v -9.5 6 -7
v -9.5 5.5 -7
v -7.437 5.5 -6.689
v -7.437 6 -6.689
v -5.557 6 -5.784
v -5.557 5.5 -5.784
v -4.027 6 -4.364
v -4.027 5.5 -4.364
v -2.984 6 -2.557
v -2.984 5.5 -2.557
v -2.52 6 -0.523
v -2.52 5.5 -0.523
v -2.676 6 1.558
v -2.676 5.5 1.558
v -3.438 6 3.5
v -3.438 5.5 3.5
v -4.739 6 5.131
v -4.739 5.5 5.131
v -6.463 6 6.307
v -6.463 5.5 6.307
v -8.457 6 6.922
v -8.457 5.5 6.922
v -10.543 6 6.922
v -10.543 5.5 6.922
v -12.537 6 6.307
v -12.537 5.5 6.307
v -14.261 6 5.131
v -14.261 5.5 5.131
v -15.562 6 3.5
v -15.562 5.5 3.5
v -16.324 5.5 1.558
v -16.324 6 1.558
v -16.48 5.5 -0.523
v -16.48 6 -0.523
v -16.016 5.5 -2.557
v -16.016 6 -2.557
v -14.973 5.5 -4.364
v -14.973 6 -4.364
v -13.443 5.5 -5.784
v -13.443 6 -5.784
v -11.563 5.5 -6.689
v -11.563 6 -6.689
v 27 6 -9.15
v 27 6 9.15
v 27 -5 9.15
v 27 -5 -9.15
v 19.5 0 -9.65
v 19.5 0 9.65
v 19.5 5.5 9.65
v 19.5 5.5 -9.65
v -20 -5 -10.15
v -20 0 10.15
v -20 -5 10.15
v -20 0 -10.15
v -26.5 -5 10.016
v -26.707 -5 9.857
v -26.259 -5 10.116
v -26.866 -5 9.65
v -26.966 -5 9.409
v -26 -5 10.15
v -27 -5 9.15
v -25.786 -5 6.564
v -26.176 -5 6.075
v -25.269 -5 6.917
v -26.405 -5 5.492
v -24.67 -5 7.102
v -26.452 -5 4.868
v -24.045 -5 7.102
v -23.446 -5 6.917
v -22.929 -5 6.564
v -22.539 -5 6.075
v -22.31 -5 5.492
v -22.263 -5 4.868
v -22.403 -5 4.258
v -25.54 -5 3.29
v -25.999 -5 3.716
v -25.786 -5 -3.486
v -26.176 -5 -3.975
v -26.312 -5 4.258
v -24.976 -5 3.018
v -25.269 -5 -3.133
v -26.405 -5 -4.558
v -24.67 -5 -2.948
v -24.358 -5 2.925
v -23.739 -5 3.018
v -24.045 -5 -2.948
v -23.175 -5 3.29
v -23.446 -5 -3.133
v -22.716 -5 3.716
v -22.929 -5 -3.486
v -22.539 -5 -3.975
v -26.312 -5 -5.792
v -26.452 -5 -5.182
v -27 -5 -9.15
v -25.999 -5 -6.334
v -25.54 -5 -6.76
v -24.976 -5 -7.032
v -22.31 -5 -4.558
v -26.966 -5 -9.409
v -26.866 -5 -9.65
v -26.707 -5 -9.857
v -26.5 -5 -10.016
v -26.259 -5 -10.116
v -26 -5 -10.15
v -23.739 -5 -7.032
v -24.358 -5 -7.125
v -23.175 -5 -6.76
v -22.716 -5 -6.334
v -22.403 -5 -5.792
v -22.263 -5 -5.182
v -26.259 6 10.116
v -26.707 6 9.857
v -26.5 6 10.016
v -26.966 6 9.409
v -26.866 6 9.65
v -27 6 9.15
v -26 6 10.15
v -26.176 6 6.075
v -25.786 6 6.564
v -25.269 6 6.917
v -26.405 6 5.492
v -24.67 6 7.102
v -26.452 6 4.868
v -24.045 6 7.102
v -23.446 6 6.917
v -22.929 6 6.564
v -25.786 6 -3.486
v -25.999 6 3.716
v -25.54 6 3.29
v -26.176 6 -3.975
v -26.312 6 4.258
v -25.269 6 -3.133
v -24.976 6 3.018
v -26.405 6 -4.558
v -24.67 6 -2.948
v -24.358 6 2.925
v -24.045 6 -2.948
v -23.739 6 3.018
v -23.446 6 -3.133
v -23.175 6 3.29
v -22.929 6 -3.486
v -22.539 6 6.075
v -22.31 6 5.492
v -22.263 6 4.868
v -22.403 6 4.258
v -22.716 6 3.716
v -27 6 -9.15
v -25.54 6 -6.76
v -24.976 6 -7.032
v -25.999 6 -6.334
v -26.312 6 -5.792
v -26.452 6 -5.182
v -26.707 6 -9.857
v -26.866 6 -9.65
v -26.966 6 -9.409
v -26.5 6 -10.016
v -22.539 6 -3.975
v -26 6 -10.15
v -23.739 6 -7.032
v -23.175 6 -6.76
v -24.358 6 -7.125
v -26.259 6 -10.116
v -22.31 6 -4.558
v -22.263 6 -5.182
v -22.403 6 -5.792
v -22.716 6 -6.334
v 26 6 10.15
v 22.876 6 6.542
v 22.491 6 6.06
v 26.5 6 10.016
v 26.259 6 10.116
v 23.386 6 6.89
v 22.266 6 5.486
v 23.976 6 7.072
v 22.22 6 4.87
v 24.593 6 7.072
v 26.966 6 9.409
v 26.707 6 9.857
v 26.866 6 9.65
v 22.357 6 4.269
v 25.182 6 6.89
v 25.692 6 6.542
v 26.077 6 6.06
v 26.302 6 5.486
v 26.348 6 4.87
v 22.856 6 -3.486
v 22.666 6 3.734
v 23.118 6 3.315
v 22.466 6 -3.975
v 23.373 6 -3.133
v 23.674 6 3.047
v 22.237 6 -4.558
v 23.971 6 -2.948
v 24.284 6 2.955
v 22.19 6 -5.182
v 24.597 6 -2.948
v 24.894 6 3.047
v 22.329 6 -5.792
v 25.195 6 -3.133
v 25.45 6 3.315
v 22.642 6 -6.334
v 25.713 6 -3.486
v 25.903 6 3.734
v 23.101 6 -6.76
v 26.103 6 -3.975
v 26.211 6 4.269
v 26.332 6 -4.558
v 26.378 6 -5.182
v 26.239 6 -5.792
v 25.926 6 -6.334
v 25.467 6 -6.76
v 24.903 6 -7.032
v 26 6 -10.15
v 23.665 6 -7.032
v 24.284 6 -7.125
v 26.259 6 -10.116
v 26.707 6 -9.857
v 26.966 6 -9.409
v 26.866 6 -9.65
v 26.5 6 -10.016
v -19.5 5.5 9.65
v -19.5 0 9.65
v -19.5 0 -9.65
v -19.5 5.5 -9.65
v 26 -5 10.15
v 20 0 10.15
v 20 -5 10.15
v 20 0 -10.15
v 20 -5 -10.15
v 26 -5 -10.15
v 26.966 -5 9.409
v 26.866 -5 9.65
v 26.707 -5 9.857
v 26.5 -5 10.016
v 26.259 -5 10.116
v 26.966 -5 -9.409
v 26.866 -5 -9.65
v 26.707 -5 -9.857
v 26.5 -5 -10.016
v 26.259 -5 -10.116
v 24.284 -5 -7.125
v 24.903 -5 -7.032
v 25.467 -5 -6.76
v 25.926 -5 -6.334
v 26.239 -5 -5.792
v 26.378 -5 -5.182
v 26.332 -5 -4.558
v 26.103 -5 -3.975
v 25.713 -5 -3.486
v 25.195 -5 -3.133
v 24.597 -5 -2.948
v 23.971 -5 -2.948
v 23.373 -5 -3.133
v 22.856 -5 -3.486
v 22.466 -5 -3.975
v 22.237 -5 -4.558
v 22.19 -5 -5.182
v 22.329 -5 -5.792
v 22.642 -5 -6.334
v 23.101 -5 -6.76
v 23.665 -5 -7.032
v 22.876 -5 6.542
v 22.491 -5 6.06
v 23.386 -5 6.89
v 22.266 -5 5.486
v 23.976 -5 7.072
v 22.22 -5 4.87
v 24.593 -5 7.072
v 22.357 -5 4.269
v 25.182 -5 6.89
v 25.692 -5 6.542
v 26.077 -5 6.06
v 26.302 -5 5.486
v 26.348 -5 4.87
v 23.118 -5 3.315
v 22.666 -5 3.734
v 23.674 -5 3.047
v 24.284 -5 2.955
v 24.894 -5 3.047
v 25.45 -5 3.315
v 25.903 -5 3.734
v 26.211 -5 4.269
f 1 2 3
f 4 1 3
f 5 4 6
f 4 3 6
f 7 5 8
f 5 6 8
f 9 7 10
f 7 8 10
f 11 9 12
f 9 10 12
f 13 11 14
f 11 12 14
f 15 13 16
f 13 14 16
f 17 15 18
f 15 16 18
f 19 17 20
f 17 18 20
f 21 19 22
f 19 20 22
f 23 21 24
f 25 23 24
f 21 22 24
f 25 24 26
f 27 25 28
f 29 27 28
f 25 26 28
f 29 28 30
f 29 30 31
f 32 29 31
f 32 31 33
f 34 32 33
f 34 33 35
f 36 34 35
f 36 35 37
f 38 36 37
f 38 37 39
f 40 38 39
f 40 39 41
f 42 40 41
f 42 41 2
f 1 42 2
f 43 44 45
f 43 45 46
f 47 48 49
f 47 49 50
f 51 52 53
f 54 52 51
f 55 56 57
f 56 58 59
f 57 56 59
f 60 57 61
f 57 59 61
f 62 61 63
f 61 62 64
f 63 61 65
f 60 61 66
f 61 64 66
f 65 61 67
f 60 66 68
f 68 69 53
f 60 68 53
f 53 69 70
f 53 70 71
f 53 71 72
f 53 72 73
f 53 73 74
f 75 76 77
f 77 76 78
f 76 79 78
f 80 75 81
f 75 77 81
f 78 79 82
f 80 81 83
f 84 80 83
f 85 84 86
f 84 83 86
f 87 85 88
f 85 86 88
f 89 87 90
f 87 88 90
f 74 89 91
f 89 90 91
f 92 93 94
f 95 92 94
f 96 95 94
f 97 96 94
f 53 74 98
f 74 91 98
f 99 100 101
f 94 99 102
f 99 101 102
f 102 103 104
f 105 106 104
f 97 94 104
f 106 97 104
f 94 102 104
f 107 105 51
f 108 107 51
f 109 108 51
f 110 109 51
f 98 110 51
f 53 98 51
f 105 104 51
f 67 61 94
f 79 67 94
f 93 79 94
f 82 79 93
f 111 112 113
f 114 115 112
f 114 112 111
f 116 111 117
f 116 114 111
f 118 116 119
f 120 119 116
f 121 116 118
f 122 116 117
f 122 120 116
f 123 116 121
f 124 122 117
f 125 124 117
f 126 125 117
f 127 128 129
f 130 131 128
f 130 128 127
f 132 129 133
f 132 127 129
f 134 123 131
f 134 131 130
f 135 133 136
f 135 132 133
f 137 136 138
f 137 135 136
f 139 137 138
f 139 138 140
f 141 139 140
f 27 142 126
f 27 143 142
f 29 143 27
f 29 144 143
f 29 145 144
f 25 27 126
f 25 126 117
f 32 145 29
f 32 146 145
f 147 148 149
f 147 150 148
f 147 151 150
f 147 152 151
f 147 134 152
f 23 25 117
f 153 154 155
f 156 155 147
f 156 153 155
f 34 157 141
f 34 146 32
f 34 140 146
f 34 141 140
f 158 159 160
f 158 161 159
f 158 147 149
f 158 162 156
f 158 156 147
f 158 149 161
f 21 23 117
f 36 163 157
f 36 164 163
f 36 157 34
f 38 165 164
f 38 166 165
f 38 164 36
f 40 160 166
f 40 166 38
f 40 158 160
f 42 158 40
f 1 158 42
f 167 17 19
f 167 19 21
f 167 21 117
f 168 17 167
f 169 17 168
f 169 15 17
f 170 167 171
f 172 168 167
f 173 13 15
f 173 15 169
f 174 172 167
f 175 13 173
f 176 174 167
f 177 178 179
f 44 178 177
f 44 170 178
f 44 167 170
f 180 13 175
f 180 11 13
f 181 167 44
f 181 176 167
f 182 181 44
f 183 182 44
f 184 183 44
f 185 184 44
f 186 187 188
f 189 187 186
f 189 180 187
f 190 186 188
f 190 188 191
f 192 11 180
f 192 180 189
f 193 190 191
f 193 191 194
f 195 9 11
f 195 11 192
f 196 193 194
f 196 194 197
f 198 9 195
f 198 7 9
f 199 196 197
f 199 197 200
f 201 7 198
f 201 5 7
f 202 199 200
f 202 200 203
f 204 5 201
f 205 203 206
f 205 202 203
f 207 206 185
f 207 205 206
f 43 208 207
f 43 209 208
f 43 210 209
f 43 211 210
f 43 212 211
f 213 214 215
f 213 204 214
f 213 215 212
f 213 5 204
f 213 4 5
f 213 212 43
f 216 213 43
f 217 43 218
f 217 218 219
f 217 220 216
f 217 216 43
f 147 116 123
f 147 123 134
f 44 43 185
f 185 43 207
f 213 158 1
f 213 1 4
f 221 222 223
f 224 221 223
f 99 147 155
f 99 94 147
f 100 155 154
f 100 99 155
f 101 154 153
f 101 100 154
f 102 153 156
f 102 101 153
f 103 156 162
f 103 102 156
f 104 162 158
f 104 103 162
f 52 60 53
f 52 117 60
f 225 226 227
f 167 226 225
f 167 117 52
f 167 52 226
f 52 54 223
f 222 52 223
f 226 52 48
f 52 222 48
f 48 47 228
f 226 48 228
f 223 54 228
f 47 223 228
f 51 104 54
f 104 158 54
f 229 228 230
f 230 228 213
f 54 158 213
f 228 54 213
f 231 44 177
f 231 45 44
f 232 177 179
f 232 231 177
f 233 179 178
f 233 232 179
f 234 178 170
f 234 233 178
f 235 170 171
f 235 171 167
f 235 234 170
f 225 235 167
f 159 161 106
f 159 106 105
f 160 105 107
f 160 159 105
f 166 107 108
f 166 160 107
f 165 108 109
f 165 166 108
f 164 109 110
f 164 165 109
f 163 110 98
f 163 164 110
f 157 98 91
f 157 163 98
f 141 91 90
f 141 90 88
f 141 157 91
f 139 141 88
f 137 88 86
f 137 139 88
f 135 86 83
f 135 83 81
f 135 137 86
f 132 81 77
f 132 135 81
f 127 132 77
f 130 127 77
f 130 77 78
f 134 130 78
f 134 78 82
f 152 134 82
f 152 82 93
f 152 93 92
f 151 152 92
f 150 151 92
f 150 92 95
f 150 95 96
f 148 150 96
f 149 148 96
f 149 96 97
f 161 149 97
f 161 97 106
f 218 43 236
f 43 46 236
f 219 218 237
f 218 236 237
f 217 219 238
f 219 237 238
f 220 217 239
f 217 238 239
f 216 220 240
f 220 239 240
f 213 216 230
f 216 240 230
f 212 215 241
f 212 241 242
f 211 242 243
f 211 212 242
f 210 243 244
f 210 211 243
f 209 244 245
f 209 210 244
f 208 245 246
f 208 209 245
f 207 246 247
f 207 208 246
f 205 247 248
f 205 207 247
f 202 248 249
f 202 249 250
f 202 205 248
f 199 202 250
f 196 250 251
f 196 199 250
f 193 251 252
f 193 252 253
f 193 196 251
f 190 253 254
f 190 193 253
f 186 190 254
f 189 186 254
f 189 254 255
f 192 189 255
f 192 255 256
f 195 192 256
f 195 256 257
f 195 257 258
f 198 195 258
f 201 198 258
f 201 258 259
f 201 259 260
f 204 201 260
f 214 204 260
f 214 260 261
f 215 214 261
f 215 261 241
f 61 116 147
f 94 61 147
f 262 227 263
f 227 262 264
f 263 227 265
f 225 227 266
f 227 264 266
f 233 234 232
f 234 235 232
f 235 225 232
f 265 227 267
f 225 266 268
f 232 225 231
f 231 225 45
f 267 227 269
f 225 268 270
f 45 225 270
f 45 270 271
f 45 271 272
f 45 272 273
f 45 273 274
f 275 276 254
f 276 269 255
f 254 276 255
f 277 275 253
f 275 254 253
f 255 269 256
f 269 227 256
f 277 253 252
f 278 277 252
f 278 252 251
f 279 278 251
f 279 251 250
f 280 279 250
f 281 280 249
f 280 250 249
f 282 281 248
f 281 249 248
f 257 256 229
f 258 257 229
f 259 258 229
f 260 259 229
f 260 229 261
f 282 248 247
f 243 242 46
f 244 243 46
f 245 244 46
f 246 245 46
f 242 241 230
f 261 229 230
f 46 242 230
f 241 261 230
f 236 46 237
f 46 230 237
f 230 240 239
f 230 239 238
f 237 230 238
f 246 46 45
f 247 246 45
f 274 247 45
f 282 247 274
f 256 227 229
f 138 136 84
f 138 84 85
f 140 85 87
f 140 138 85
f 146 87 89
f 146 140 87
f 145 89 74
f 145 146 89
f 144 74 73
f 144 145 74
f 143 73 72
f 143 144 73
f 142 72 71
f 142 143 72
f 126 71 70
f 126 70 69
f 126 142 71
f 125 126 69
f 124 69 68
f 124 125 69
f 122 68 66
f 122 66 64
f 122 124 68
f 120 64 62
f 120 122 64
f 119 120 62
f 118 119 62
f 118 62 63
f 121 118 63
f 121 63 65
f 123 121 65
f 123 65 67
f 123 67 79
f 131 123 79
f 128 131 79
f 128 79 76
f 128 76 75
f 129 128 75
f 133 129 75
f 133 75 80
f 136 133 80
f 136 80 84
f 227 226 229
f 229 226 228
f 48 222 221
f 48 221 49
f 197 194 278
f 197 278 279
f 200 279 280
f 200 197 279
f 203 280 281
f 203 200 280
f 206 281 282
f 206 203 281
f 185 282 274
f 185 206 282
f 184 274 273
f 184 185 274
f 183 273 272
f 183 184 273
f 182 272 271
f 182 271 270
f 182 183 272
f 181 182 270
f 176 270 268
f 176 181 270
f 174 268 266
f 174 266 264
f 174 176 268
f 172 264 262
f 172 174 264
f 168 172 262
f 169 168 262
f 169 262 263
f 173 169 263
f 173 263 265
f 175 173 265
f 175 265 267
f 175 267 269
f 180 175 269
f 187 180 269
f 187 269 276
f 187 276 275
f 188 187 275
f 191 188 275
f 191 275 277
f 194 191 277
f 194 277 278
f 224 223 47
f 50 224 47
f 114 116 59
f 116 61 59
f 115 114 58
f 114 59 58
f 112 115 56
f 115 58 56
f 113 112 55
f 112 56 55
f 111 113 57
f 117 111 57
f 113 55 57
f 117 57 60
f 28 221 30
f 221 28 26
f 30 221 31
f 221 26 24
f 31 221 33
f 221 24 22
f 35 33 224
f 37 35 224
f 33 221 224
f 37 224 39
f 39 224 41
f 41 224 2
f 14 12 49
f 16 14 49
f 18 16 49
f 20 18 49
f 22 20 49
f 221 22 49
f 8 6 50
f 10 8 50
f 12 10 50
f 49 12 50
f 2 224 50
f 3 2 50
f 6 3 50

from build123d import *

# Parameters (mm, degrees)
SKETCH1_W               = 40
SKETCH1_H               = 20.3
BOSS_EXTRUDE3_DEPTH     = 6
SHELL1_T                = -0.5
SKETCH4_W               = 7
SKETCH4_H               = 20.3
BOSS_EXTRUDE4_DEPTH     = 11
FILLET1_R               = 1
SKETCH5_R               = 2.1
SKETCH5_R_2             = 2.070075265
CUT_EXTRUDE3_DEPTH      = 6
SKETCH7_R               = 7
CUT_EXTRUDE4_DEPTH      = 88
CUT_EXTRUDE5_DEPTH      = 30.462221573
CUT_EXTRUDE5_DEPTH_BACK = 30.462221573
SKETCH8_R               = 2.1
SKETCH8_R_2             = 2.070075265


with BuildPart() as part:
    # Sketch1 → Boss-Extrude3 (new body)
    with BuildSketch(Plane(origin=(0, 0, 0), x_dir=(1, 0, 0), z_dir=(0, 1, 0))):
        Rectangle(SKETCH1_W, SKETCH1_H)
    extrude(amount=BOSS_EXTRUDE3_DEPTH)

    # Shell1
    shell1_openings = [part.faces().sort_by_distance(p)[0] for p in [
        (0, 0, 0),
    ]]
    offset(amount=SHELL1_T, openings=shell1_openings, kind=Kind.INTERSECTION)

    # Sketch4 → Boss-Extrude4 (add)
    with BuildSketch(Plane(origin=(0, 6, 0), x_dir=(1, 0, 0), z_dir=(0, 1, 0))):
        with Locations((-23.5, 0)):
            Rectangle(SKETCH4_W, SKETCH4_H)
        with Locations((23.5, 0)):
            Rectangle(SKETCH4_W, SKETCH4_H)
    extrude(amount=-BOSS_EXTRUDE4_DEPTH)

    # Fillet1
    fillet1_edges = [part.edges().sort_by_distance(p)[0] for p in [
        (-27, 0.5, 10.15),
        (-27, 0.5, -10.15),
        (27, 0.5, -10.15),
        (27, 0.5, 10.15),
    ]]
    fillet(fillet1_edges, radius=FILLET1_R)

    # Sketch5 → Cut-Extrude3 (cut)
    with BuildSketch(Plane.XZ.offset(5)):
        with Locations(Location((-24.35750849, 5.025, 0), (0, 0, 270))):
            Circle(SKETCH5_R)
        with Locations(Location((-24.35750849, -5.025, 0), (0, 0, 270))):
            Circle(SKETCH5_R)
        with Locations(Location((24.284171764, 5.025, 0), (0, 0, 270))):
            Circle(SKETCH5_R_2)
        with Locations(Location((24.284171764, -5.025, 0), (0, 0, 270))):
            Circle(SKETCH5_R)
    extrude(amount=-CUT_EXTRUDE3_DEPTH, mode=Mode.SUBTRACT)

    # Sketch7 → Cut-Extrude4 (cut)
    with BuildSketch(Plane.XZ.offset(-5.5)):
        with Locations(Location((-9.5, 0, 0), (0, 0, 270))):
            Circle(SKETCH7_R)
    extrude(amount=-CUT_EXTRUDE4_DEPTH, mode=Mode.SUBTRACT)

    # Sketch8 → Cut-Extrude5 (cut, two sides: drawn at the far end of the back side and taken through both)
    with BuildSketch(Plane.XZ.offset(-1).offset(-CUT_EXTRUDE5_DEPTH_BACK)):
        with Locations(Location((24.284171764, -5.025, 0), (0, 0, 270))):
            Circle(SKETCH8_R)
        with Locations(Location((24.284171764, 5.025, 0), (0, 0, 270))):
            Circle(SKETCH8_R_2)
        with Locations(Location((-24.35750849, 5.025, 0), (0, 0, 270))):
            Circle(SKETCH8_R)
        with Locations(Location((-24.35750849, -5.025, 0), (0, 0, 270))):
            Circle(SKETCH8_R)
    extrude(amount=CUT_EXTRUDE5_DEPTH + CUT_EXTRUDE5_DEPTH_BACK, mode=Mode.SUBTRACT)


solid = part.part
